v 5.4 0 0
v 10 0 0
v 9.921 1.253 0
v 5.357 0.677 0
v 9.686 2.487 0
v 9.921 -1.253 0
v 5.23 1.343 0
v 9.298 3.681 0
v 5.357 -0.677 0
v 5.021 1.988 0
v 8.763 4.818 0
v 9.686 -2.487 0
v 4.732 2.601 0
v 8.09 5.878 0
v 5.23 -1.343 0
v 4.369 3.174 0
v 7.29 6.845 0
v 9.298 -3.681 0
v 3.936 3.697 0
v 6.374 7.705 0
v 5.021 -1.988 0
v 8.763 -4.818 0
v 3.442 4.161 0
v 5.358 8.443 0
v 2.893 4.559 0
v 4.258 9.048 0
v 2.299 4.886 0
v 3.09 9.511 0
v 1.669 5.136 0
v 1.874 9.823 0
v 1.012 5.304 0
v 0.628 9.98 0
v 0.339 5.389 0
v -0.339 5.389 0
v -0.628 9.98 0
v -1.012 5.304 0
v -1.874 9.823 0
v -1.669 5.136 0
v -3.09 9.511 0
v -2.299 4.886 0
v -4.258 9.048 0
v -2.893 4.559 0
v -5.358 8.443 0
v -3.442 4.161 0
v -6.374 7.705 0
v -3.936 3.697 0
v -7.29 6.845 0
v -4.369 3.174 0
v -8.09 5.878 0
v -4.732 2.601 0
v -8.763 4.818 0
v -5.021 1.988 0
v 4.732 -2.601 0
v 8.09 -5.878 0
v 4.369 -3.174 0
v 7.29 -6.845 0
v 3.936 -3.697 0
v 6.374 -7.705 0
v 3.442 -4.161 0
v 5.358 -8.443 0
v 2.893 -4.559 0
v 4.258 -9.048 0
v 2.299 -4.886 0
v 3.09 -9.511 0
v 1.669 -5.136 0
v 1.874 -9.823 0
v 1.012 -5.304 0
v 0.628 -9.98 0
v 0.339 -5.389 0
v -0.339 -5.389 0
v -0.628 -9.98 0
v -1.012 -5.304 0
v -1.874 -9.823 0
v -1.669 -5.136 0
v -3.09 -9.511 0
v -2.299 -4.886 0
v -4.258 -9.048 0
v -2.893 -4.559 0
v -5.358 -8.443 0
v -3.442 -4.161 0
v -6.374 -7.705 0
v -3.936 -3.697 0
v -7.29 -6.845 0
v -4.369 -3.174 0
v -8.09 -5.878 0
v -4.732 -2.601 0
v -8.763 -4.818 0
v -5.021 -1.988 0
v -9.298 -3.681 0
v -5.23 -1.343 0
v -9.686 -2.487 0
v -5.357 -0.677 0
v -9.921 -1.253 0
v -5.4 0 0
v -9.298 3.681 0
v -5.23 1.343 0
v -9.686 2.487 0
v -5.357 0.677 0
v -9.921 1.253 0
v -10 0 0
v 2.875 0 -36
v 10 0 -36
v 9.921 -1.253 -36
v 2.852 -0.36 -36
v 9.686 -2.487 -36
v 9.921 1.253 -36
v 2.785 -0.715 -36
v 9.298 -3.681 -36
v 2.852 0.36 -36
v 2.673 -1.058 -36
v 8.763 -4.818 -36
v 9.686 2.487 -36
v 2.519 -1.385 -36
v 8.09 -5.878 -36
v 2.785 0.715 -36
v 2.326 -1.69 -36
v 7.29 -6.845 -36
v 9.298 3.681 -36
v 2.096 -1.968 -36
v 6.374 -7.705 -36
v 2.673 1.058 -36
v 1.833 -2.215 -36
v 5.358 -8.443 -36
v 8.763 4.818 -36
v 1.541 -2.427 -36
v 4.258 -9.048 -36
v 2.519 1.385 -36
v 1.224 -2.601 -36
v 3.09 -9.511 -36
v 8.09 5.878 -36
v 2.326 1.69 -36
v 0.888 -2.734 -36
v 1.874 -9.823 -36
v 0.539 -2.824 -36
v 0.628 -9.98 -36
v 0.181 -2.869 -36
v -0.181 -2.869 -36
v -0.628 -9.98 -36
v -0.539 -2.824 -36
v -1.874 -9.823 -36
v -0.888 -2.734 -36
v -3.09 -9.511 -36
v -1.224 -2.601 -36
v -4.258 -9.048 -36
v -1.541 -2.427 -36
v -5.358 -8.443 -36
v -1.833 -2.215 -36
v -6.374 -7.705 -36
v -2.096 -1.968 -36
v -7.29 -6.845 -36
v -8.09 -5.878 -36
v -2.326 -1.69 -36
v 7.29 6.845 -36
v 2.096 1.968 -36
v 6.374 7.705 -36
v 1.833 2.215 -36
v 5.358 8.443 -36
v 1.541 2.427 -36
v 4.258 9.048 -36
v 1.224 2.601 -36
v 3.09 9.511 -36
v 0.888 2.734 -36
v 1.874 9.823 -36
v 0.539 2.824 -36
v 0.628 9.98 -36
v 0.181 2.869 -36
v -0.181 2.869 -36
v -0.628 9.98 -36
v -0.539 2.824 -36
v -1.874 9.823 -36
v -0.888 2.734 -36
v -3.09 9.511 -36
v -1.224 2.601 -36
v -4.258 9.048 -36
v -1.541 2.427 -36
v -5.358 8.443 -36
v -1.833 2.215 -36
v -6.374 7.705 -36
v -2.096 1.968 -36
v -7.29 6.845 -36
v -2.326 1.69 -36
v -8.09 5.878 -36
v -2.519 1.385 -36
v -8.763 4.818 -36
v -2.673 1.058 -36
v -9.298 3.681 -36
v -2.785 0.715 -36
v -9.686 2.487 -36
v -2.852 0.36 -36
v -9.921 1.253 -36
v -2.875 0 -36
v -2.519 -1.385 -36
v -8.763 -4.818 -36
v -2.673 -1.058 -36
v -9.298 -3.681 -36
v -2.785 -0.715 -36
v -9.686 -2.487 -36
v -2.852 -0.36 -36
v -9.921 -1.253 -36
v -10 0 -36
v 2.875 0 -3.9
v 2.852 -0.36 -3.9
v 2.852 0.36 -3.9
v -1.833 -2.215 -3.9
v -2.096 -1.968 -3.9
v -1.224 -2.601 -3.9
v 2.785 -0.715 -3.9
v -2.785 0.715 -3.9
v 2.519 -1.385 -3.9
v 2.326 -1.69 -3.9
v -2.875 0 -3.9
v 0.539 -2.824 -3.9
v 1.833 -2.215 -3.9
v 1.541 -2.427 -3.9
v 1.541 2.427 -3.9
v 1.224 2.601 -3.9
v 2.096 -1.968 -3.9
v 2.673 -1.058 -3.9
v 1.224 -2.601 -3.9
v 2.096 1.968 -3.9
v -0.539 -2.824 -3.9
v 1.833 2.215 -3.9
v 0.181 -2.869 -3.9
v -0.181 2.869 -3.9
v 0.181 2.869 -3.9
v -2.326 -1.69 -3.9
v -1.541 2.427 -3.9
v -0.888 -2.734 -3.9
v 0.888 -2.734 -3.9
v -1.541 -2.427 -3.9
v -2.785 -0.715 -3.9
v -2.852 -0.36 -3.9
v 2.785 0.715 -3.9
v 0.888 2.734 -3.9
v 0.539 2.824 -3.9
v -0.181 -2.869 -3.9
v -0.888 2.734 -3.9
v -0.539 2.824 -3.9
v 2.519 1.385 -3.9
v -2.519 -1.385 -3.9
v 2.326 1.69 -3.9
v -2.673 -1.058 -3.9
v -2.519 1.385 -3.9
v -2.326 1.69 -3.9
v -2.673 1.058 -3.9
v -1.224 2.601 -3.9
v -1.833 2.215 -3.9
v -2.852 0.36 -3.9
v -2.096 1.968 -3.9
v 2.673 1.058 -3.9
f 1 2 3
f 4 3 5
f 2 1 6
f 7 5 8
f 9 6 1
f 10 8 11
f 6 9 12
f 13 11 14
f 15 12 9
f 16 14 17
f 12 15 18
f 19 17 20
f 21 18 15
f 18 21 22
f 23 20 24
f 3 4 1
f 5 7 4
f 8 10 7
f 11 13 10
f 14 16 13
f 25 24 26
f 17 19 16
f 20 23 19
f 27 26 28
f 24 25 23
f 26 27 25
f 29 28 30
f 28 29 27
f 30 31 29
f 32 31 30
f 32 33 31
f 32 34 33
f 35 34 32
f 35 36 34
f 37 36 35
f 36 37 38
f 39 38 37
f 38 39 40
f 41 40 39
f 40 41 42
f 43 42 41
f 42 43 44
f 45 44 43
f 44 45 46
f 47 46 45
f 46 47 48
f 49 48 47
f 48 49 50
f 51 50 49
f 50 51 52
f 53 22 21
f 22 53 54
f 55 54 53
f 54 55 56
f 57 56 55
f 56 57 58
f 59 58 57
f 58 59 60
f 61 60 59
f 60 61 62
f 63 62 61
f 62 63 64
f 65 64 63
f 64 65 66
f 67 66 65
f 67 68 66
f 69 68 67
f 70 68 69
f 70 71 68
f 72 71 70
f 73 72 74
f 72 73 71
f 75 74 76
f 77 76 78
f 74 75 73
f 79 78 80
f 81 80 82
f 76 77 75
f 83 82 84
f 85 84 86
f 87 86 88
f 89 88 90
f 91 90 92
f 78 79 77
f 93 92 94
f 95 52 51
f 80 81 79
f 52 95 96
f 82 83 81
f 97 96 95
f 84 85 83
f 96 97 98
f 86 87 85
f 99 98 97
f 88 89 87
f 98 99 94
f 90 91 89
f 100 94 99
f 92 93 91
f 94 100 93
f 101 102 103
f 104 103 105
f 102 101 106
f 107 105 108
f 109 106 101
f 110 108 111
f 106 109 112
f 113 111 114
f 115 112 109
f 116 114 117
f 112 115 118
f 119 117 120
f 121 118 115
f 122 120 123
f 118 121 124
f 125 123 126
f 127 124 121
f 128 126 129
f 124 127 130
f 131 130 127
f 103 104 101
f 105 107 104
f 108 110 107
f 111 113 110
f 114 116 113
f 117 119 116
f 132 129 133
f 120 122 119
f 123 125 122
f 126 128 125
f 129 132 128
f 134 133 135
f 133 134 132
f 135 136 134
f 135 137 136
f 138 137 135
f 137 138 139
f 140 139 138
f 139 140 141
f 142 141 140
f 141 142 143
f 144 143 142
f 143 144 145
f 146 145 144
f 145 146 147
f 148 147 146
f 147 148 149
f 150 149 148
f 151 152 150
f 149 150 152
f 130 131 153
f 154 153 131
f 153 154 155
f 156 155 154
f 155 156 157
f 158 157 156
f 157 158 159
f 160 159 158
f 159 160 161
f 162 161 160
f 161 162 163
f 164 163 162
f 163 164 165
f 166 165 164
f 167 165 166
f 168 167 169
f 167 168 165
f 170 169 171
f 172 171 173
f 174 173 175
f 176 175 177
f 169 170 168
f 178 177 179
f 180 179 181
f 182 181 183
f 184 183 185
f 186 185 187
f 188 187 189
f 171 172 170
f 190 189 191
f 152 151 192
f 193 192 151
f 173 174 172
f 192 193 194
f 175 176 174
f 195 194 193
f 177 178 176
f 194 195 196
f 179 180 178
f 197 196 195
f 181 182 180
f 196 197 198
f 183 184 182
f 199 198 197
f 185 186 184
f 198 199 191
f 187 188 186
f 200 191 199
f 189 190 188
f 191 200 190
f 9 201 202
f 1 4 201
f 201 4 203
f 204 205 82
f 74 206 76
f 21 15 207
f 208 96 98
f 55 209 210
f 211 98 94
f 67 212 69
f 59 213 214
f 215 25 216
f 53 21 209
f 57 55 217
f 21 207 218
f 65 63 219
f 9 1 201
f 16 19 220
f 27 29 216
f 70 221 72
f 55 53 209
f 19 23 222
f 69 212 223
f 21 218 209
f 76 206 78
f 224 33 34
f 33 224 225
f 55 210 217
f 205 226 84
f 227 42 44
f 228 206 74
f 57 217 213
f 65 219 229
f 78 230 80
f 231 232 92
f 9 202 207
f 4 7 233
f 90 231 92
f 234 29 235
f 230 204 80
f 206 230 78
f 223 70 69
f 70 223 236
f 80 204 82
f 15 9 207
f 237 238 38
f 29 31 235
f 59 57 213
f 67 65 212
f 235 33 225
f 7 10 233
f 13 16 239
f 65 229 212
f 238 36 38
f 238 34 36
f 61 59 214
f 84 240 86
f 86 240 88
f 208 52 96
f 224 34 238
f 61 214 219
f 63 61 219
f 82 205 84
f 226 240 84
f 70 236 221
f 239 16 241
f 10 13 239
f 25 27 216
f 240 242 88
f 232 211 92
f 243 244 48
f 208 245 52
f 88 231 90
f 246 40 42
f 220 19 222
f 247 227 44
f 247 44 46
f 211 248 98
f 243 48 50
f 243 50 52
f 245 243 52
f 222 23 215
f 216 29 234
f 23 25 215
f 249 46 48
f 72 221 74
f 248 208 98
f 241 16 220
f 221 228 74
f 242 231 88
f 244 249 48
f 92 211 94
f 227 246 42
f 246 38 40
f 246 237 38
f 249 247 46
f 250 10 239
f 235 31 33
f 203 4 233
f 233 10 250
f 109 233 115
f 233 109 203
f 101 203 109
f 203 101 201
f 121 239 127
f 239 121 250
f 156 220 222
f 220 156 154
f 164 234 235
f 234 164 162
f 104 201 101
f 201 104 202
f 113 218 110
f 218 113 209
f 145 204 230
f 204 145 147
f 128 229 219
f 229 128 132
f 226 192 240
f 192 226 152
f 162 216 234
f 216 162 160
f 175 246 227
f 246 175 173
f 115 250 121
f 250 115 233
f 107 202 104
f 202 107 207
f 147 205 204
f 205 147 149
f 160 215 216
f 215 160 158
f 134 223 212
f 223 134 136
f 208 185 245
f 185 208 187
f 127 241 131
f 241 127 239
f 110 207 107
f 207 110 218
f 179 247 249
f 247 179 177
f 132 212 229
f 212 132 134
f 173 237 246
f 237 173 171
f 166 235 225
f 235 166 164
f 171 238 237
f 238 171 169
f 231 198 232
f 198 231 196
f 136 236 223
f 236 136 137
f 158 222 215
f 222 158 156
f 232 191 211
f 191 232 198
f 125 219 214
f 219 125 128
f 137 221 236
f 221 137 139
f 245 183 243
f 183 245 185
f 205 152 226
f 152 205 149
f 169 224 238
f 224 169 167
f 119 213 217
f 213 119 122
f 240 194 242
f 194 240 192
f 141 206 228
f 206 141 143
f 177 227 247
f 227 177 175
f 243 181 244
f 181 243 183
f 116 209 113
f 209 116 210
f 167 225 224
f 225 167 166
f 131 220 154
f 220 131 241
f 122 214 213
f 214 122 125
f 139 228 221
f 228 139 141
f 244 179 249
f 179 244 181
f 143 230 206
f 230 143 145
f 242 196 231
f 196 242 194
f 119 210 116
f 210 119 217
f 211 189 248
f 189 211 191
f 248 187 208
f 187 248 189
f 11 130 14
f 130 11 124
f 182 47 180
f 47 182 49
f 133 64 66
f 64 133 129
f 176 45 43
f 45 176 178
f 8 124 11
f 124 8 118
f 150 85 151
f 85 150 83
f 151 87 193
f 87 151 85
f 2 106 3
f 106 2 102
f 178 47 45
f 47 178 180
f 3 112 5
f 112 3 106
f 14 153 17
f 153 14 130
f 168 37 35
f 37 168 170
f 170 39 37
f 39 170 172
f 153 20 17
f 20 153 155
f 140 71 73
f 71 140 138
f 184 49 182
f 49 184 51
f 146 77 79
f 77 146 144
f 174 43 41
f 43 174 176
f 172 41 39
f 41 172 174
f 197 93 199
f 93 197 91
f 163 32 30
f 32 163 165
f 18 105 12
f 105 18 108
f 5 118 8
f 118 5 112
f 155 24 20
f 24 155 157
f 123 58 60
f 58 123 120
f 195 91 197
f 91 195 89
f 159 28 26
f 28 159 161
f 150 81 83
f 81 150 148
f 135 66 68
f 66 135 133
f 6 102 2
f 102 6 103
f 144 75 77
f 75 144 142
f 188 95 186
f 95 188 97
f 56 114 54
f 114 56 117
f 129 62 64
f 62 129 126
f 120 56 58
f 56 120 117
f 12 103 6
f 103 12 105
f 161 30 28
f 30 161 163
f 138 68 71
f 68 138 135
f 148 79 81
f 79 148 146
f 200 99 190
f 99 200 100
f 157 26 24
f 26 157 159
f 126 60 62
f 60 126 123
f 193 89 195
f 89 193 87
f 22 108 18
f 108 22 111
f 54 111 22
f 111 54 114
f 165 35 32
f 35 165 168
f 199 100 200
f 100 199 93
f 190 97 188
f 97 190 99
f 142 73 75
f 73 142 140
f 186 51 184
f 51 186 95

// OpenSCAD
$fn = 50;


difference() {
	union() {
		translate(v = [0, 0, -36.0000000000]) {
			cylinder(h = 36, r = 10.0000000000);
		}
		cylinder(h = 0, r = 20.0000000000);
	}
	union() {
		translate(v = [0, 0, 0]) {
			rotate(a = [0, 0, 0]) {
				difference() {
					union() {
						#translate(v = [0, 0, -36.0000000000]) {
							cylinder(h = 36, r = 2.6000000000);
						}
						#translate(v = [0, 0, -3.9000000000]) {
							cylinder(h = 3.9000000000, r = 10.0000000000, r1 = 2.8750000000, r2 = 5.4000000000);
						}
						#translate(v = [0, 0, -36.0000000000]) {
							cylinder(h = 36, r = 2.8750000000);
						}
						#translate(v = [0, 0, -36.0000000000]) {
							cylinder(h = 36, r = 2.6000000000);
						}
					}
					union();
				}
			}
		}
	}
}
